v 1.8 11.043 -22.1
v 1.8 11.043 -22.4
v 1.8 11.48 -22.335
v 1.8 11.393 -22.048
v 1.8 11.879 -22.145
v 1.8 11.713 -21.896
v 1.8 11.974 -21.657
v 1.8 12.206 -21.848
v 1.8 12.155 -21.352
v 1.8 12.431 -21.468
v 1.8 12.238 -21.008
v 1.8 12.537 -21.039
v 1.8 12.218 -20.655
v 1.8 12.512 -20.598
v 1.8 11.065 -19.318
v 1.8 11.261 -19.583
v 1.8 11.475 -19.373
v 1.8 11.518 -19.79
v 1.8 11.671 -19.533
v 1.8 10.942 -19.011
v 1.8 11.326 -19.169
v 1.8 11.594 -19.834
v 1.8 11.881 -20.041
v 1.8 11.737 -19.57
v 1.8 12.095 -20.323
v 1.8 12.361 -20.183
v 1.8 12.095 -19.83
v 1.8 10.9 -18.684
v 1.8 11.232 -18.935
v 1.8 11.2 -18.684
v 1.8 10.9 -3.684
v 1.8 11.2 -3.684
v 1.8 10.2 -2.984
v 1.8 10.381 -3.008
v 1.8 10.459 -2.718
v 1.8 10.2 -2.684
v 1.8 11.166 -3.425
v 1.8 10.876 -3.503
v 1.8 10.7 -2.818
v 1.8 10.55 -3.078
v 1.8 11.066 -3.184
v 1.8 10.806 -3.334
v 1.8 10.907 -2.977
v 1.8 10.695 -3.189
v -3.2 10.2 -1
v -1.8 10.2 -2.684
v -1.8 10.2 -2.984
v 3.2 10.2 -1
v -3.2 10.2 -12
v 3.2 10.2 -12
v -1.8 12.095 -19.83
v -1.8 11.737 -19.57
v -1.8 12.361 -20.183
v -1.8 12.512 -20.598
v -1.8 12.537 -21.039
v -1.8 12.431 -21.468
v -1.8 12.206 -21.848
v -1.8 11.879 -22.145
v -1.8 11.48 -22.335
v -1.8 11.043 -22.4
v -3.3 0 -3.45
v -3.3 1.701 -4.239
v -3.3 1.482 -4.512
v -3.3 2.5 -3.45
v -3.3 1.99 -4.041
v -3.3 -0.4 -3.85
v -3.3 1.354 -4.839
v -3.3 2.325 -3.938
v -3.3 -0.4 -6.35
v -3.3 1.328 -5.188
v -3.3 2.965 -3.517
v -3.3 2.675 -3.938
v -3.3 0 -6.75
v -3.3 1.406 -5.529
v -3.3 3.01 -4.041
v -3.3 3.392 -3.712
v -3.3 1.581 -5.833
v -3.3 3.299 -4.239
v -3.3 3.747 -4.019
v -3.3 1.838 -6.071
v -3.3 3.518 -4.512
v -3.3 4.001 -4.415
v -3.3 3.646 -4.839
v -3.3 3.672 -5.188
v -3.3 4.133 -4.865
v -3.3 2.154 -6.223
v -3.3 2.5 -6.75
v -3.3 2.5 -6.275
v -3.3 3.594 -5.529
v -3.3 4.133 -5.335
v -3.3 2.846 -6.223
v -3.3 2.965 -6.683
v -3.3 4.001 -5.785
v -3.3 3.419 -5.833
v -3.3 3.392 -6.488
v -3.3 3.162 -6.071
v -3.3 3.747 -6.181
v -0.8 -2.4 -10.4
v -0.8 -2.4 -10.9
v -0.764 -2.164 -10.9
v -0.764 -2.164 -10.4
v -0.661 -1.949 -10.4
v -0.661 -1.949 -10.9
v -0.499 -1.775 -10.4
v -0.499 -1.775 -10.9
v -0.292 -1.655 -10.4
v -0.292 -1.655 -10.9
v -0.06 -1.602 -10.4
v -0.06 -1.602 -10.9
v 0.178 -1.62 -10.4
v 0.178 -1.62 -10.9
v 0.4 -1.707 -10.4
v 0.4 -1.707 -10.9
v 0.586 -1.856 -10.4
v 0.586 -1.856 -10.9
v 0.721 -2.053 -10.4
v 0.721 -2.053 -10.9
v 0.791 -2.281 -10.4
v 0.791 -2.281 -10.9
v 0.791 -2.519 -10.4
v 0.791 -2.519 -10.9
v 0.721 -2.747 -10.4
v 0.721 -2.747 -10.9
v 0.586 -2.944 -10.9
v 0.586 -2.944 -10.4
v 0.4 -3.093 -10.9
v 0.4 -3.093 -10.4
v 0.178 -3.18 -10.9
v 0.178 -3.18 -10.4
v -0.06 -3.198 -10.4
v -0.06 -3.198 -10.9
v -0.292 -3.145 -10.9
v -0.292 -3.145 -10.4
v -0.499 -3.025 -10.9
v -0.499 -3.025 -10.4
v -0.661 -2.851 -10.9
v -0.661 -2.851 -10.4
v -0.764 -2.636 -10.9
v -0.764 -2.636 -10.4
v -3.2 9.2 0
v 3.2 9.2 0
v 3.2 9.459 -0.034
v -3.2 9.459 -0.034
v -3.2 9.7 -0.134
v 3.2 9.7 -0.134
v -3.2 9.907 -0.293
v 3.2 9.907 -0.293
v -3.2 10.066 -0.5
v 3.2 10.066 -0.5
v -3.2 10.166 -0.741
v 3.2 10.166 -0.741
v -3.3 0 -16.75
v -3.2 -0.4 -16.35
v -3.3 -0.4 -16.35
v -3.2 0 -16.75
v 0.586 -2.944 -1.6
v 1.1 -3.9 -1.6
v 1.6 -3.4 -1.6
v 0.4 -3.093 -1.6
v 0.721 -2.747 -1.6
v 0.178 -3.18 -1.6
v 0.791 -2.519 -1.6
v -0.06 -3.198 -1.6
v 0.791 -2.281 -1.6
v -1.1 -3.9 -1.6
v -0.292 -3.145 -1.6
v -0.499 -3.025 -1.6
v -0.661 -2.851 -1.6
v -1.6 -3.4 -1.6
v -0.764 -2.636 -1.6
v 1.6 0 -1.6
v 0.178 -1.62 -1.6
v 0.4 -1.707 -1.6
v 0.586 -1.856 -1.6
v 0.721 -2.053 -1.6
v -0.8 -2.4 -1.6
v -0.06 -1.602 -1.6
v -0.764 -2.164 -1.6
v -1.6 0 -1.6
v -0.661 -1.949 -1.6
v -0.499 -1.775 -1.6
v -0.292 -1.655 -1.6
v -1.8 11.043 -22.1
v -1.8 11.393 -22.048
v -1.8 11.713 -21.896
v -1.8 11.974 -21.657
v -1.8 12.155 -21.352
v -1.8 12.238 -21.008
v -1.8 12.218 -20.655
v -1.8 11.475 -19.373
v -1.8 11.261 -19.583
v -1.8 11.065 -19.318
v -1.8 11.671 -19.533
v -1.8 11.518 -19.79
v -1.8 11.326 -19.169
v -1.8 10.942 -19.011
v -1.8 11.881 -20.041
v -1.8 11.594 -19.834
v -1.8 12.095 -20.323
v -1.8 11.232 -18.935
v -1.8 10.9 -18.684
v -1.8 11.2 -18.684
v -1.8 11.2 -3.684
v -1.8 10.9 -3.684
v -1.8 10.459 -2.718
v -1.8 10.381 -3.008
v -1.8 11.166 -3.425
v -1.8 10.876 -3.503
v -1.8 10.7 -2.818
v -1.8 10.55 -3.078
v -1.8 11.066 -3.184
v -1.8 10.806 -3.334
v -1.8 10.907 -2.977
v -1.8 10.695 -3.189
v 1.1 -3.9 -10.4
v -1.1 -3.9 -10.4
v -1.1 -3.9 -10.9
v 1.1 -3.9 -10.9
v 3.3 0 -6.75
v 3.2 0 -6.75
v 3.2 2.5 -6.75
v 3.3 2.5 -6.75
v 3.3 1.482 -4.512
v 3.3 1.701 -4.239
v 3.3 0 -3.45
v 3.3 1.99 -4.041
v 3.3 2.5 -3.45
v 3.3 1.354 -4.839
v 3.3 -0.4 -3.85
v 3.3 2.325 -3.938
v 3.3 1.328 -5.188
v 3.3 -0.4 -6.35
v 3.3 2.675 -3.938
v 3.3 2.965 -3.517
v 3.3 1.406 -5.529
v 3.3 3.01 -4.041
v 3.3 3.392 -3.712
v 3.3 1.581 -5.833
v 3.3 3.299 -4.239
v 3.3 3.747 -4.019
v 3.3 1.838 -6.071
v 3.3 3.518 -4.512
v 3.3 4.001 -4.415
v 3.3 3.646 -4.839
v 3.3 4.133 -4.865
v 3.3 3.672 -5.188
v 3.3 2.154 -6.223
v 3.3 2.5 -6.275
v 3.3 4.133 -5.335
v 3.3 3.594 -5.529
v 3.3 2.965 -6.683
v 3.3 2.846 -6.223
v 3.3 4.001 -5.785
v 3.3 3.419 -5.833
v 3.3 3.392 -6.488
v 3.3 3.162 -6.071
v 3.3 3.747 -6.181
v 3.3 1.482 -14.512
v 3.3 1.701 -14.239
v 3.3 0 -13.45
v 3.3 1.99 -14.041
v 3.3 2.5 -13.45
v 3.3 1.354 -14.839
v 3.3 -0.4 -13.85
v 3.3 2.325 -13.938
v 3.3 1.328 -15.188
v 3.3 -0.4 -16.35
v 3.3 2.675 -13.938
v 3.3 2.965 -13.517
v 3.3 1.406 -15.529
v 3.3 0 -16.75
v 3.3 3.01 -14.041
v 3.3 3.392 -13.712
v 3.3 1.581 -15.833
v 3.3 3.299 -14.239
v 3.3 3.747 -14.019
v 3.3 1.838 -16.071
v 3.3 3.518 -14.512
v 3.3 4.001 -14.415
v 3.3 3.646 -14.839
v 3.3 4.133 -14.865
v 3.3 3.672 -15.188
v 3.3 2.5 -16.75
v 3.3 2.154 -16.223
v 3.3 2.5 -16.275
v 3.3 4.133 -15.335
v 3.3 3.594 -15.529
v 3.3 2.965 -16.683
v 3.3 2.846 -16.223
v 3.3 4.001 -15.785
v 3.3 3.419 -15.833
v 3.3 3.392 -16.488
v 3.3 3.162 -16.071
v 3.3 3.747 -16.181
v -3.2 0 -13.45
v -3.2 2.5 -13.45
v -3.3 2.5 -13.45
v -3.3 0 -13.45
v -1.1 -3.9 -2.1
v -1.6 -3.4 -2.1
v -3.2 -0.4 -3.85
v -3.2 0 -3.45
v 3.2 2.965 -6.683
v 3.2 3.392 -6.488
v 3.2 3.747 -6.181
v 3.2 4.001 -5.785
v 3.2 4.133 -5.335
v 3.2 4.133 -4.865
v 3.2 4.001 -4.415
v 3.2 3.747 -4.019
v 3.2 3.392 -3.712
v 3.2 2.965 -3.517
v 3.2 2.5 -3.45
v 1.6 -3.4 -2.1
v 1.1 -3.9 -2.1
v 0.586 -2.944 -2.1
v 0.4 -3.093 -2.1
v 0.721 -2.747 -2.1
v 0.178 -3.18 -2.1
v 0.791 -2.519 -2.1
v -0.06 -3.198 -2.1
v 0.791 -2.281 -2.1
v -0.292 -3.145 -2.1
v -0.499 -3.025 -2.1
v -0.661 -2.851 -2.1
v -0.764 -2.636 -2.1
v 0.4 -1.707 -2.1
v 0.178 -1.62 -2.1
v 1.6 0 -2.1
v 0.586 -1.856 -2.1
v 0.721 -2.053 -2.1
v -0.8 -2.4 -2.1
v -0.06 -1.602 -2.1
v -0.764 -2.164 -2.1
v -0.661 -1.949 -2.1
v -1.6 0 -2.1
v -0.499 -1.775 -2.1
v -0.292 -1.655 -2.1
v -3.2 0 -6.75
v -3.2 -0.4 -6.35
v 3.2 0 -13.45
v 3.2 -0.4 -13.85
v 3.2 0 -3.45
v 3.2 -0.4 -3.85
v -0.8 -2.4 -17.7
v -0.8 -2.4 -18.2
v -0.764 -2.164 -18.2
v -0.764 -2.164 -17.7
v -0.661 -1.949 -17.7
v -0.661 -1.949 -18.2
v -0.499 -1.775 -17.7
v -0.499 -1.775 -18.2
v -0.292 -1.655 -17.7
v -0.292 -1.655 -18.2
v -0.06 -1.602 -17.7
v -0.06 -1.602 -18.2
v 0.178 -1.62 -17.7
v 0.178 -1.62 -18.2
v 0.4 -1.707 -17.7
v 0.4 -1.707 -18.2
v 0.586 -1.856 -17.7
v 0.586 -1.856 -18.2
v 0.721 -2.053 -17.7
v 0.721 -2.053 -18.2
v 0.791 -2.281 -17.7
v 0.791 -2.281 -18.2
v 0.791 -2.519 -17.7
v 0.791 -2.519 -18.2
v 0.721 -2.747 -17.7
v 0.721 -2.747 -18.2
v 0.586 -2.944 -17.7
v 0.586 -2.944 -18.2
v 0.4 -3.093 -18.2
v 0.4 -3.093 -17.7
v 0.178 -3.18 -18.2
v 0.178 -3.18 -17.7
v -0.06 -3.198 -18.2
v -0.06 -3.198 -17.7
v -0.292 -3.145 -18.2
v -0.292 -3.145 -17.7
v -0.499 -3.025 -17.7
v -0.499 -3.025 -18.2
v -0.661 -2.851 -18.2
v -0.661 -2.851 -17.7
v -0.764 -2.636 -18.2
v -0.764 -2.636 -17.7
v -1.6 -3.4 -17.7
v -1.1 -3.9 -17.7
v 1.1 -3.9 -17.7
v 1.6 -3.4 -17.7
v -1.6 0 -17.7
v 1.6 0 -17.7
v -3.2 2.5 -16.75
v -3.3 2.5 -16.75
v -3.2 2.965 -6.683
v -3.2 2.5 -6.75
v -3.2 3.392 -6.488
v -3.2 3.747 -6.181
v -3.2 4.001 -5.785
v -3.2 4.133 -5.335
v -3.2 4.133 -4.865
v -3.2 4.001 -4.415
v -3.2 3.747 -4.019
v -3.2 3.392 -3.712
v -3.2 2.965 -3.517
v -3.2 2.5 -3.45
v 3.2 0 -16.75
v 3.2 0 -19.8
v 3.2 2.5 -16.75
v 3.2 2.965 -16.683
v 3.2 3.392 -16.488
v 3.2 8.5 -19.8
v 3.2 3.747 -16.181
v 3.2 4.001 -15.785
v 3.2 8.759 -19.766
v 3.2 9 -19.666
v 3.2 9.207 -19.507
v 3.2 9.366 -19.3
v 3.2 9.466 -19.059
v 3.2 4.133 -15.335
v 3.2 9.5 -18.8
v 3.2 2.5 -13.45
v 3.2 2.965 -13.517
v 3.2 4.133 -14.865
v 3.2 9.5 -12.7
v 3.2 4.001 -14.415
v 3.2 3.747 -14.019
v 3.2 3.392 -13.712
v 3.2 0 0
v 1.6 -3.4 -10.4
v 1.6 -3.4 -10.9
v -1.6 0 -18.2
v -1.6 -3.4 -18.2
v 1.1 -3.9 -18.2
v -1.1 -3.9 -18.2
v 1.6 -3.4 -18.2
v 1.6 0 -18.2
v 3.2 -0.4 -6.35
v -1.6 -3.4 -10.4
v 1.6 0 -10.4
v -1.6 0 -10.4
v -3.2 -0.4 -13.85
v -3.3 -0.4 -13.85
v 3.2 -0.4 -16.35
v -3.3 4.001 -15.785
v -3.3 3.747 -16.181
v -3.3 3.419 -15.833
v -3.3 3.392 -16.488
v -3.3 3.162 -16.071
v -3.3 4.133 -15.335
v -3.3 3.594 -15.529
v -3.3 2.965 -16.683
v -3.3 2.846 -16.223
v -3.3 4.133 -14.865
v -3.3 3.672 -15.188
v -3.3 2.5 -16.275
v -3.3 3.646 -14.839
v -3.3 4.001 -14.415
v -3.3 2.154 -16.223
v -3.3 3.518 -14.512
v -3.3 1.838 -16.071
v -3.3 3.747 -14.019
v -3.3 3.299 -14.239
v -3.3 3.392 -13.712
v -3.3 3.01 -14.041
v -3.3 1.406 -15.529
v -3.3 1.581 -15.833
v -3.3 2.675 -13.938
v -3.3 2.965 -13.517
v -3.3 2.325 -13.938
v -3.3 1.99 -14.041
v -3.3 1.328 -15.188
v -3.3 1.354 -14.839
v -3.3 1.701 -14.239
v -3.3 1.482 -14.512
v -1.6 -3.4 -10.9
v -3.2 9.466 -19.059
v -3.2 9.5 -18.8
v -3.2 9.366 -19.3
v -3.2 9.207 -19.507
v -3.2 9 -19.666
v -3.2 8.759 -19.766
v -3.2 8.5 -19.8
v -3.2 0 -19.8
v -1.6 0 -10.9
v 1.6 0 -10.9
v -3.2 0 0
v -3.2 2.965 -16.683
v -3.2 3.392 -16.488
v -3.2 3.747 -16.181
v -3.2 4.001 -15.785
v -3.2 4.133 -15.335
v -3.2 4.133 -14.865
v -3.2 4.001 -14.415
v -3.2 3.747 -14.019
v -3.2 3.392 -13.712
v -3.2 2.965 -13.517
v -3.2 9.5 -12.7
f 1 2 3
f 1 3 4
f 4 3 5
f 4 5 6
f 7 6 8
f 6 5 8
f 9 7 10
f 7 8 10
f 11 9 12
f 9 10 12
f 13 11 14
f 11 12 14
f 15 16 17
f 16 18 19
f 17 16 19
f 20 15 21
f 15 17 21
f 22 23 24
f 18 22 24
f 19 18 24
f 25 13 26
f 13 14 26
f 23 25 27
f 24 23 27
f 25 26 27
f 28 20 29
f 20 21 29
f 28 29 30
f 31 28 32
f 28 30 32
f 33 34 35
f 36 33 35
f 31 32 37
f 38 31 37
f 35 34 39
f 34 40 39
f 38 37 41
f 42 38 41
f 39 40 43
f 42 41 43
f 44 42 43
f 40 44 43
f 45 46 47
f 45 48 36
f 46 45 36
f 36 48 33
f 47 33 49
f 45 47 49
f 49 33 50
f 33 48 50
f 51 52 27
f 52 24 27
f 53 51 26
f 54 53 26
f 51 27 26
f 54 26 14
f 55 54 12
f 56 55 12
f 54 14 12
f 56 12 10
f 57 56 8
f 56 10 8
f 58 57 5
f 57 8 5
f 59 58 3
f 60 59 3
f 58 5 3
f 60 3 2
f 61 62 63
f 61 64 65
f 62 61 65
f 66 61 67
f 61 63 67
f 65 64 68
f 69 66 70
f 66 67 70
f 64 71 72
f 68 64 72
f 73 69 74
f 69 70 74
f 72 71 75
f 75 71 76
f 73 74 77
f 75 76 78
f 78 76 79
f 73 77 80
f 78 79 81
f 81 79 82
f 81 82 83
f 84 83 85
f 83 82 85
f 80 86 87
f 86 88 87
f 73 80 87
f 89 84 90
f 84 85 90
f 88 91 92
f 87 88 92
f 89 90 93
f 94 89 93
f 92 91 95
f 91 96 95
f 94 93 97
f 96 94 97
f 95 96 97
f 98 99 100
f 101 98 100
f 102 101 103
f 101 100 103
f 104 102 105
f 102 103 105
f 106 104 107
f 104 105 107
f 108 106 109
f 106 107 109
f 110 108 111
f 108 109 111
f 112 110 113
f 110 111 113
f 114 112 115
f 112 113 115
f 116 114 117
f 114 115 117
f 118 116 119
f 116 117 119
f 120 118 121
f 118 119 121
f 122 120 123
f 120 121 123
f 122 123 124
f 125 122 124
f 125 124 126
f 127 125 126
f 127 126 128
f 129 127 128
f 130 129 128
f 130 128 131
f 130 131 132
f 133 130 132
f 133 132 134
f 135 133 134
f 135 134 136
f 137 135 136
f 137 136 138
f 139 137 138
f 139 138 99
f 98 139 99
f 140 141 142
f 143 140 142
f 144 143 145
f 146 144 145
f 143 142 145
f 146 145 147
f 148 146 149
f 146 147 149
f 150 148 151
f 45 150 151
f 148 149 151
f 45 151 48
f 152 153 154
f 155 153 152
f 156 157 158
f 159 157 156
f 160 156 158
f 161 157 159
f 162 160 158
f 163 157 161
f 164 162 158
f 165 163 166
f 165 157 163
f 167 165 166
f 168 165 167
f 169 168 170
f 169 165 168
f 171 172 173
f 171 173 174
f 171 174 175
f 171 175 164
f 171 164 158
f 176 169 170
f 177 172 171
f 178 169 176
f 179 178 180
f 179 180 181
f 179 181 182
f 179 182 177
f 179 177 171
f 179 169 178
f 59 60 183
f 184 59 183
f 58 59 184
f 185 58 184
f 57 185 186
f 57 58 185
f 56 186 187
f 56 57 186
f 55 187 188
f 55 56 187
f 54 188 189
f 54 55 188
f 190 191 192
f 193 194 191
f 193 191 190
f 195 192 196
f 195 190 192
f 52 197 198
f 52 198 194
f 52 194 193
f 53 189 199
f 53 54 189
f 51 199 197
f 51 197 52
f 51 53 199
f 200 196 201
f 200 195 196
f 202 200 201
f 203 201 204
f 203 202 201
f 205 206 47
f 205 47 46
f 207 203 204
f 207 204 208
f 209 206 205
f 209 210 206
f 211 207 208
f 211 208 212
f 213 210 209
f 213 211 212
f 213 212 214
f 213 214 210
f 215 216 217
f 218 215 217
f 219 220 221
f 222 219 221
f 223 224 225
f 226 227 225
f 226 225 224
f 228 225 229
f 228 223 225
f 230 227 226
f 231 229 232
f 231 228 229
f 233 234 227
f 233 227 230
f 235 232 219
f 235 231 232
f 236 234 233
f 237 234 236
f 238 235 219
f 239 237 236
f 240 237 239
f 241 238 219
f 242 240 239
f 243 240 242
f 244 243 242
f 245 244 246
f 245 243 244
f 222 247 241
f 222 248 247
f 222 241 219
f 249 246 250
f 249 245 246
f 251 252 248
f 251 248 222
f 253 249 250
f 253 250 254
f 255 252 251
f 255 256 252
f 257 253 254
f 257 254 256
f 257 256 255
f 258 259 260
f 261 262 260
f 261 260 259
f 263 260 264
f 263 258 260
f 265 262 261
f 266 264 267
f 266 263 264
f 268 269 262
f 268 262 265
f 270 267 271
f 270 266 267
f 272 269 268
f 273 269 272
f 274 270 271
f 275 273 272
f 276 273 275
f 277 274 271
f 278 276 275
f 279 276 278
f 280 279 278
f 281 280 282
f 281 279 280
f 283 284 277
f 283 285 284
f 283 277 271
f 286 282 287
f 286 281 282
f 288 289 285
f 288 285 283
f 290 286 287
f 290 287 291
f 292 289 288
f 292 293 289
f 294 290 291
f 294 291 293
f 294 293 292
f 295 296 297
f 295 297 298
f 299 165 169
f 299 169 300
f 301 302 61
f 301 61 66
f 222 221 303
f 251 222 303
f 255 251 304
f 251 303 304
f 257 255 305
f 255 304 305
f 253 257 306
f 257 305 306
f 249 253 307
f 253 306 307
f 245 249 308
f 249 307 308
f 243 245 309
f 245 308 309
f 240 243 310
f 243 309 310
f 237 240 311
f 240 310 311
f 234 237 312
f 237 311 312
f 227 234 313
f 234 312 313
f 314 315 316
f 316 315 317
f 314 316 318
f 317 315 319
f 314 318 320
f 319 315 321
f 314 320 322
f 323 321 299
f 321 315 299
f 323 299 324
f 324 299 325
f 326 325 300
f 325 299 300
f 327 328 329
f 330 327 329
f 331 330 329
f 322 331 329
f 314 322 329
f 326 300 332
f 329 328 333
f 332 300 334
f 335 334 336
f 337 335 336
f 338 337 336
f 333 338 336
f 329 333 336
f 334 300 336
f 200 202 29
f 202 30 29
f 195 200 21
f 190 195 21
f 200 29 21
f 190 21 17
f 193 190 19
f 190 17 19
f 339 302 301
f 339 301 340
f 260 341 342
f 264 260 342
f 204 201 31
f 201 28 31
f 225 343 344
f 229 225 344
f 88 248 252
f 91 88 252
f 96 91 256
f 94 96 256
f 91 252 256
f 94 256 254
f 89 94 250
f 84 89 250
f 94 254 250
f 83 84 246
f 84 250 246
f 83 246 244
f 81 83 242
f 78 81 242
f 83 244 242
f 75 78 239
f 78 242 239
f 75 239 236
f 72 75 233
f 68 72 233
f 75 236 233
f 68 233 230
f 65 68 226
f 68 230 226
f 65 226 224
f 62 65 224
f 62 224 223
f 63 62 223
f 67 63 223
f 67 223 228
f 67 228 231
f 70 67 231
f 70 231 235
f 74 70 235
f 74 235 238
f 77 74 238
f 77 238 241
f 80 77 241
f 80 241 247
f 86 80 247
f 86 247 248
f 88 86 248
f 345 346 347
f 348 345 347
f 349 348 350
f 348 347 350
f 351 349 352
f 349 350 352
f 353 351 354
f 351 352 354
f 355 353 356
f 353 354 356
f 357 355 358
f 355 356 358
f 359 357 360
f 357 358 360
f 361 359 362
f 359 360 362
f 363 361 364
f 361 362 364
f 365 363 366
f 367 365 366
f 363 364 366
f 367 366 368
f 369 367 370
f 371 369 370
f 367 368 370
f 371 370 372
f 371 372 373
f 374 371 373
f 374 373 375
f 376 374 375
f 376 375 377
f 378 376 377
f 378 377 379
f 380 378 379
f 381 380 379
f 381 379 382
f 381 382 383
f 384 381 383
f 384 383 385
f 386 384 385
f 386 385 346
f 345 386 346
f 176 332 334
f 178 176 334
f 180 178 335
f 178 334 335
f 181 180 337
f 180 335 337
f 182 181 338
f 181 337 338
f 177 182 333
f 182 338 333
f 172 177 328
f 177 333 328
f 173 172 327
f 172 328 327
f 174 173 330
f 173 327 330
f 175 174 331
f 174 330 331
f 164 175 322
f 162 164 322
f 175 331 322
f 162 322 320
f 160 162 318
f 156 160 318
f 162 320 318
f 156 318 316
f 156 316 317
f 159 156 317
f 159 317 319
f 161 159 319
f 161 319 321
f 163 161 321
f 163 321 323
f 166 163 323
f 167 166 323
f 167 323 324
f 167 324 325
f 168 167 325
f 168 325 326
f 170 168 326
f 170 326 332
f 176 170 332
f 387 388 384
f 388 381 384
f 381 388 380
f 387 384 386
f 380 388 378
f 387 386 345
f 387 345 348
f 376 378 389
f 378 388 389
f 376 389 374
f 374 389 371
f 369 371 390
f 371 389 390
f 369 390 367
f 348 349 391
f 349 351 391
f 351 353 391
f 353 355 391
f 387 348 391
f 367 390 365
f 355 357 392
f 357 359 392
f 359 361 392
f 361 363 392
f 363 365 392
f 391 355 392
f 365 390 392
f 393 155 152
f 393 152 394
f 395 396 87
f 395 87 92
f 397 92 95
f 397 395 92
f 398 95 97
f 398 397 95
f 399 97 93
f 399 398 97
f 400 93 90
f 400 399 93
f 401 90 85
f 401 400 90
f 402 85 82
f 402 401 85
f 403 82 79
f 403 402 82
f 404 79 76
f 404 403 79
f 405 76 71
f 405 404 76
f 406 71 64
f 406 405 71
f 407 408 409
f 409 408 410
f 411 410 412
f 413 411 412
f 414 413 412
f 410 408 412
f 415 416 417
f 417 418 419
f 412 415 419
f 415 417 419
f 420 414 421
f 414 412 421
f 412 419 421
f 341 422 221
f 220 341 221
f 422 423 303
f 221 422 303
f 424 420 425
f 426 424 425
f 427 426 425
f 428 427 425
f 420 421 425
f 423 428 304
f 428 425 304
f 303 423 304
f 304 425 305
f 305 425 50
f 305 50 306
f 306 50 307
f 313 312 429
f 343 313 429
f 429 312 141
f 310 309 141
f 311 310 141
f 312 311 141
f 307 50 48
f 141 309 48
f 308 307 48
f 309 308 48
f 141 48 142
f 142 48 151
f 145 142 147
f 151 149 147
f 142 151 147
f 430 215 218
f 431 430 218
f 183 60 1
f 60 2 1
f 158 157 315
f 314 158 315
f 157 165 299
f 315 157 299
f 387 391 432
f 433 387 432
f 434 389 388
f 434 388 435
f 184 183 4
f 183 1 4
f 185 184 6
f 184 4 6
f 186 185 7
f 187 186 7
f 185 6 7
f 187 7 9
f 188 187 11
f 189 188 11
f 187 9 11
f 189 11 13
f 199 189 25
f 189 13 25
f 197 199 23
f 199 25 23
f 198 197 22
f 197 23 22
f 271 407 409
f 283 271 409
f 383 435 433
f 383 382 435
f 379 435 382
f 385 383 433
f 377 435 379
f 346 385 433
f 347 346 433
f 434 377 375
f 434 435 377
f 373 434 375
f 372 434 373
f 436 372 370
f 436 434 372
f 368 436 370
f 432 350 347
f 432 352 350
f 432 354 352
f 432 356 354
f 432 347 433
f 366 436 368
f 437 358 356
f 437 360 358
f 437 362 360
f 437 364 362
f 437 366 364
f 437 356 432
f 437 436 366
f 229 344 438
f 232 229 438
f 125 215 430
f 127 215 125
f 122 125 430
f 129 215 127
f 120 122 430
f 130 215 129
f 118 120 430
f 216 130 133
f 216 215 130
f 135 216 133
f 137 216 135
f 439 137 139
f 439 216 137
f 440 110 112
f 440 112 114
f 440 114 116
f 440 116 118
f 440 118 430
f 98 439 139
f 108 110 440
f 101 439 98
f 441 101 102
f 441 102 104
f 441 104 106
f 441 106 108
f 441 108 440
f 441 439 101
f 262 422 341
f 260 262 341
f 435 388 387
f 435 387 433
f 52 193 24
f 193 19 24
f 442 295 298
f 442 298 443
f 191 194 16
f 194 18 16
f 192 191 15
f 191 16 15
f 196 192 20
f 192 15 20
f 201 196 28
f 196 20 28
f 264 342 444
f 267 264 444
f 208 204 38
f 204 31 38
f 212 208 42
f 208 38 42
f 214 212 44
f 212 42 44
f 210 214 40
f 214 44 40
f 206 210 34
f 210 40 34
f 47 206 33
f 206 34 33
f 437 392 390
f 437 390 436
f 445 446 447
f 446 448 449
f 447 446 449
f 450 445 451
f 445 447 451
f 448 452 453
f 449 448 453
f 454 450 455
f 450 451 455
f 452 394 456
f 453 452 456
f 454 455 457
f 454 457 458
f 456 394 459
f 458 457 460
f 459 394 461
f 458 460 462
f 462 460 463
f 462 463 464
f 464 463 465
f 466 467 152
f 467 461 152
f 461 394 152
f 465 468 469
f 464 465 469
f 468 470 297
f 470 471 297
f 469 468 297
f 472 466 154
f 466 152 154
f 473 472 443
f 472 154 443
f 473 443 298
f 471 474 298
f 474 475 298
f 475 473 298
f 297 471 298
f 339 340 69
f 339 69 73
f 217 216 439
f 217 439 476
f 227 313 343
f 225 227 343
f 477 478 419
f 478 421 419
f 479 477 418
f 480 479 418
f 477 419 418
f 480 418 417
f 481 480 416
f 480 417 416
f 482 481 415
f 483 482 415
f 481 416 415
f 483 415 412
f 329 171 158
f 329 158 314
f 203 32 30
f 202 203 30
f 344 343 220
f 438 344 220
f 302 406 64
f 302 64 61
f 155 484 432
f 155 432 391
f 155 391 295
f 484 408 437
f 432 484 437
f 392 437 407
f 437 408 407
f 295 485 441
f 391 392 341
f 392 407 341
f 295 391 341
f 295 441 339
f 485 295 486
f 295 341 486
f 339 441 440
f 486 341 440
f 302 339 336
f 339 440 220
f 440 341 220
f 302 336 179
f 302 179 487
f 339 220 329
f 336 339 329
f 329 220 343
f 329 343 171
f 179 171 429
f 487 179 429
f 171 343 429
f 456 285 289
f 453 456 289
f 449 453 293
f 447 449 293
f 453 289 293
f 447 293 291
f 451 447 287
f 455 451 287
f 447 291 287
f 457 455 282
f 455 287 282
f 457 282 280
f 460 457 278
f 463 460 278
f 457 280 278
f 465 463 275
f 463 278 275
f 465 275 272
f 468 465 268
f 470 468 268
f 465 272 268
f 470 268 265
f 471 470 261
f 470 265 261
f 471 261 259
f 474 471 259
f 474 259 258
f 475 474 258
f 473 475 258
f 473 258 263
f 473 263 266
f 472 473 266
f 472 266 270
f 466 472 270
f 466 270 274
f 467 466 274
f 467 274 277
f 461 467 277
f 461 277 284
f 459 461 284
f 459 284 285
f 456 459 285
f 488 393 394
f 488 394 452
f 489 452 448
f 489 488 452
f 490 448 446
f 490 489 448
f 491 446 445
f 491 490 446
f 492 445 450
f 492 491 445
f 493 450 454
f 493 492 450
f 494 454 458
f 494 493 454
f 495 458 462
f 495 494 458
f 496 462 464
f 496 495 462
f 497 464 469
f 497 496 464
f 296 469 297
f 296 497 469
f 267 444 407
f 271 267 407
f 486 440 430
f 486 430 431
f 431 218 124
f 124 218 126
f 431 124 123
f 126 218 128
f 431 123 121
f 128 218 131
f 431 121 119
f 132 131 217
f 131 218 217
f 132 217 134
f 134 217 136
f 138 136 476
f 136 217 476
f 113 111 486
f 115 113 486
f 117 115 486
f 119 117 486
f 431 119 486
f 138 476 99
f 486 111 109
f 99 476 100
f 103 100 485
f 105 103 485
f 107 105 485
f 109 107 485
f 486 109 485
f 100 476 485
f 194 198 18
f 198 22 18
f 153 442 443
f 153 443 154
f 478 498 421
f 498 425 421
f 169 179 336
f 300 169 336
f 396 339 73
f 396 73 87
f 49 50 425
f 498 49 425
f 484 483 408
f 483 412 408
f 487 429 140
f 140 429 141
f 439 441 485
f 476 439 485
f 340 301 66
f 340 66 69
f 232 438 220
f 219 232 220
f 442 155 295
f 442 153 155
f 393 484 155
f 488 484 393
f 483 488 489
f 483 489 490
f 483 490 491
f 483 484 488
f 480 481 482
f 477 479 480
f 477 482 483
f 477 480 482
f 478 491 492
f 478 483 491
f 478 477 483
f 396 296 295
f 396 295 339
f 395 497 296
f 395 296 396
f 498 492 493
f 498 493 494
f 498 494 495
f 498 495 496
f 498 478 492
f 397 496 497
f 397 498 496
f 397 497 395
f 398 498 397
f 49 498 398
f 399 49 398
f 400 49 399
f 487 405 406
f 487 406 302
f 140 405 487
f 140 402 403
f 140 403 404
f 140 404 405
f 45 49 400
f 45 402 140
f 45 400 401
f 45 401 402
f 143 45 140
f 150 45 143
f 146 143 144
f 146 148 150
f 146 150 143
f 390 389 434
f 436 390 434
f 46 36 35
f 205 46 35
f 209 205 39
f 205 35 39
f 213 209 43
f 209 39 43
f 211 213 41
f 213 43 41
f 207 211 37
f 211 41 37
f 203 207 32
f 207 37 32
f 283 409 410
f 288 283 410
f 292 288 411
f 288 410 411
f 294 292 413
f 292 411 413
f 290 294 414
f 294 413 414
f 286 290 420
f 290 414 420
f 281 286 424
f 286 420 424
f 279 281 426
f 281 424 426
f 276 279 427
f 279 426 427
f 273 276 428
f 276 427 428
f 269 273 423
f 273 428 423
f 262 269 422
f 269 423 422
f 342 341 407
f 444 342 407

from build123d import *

# Parameters (mm, degrees)
EXTRUDE_1_DEPTH        = 3.2
SKETCH_3_W             = 0.5
SKETCH_3_H             = 3.9
EXTRUDE_3_DEPTH        = 1.6
CHAMFER_1_SIZE         = 0.5
SKETCH_4_R             = 0.8
CUT_EXTRUDE_1_DEPTH    = 22.107344693
EXTRUDE_4_DEPTH        = 0.1
PATTERN_LINEAR_1_COUNT = 2
PATTERN_LINEAR_1_PITCH = 10
MIRROR_1_COPY_1_DEPTH  = 0.1
SKETCH_6_R             = 1.175
CUT_EXTRUDE_2_DEPTH    = 24.230152819
EXTRUDE_2_DEPTH        = 1.8


with BuildPart() as part:
    # ｽｹｯﾁ1 → ﾎﾞｽ - 押し出し1 (new, symmetric)
    with BuildSketch(Plane(origin=(0, 0, 0), x_dir=(0, 0, -1), z_dir=(1, 0, 0))):
        with BuildLine():
            Line((12, 10.2), (12.7, 9.5))
            Line((12.7, 9.5), (18.8, 9.5))
            ThreePointArc((18.8, 9.5), (19.507106781, 9.207106781), (19.8, 8.5))
            Line((19.8, 8.5), (19.8, 0))
            Line((19.8, 0), (0, 0))
            Line((0, 0), (0, 9.2))
            ThreePointArc((0, 9.2), (0.292893219, 9.907106781), (1, 10.2))
            Line((1, 10.2), (12, 10.2))
        make_face()
    extrude(amount=EXTRUDE_1_DEPTH, both=True)

    # ｽｹｯﾁ3 → ﾎﾞｽ - 押し出し3 (add, symmetric)
    with BuildSketch(Plane(origin=(0, 0, 0), x_dir=(0, 0, -1), z_dir=(1, 0, 0))):
        with Locations((1.85, -1.95)):
            Rectangle(SKETCH_3_W, SKETCH_3_H)
        with Locations((10.65, -1.95)):
            Rectangle(SKETCH_3_W, SKETCH_3_H)
        with Locations((17.95, -1.95)):
            Rectangle(SKETCH_3_W, SKETCH_3_H)
    extrude(amount=EXTRUDE_3_DEPTH, both=True)

    # 面取り1
    chamfer_1_edges = [part.edges().sort_by_distance(p)[0] for p in [
        (-1.6, -3.9, -1.85),
        (1.6, -3.9, -1.85),
        (-1.6, -3.9, -10.65),
        (1.6, -3.9, -10.65),
        (-1.6, -3.9, -17.95),
        (1.6, -3.9, -17.95),
    ]]
    chamfer(chamfer_1_edges, length=CHAMFER_1_SIZE)

    # ｽｹｯﾁ4 → ｶｯﾄ - 押し出し1 (cut, through all)
    with BuildSketch(Plane(origin=(0, 0, -18.2), x_dir=(-1, 0, 0), z_dir=(0, 0, -1))):
        with Locations((0, -2.4)):
            Circle(SKETCH_4_R)
    extrude(amount=-CUT_EXTRUDE_1_DEPTH, mode=Mode.SUBTRACT)

    # ｽｹｯﾁ5 → ﾎﾞｽ - 押し出し4 (add)
    with BuildSketch(Plane(origin=(3.2, 0, 0), x_dir=(0, 0, -1), z_dir=(1, 0, 0))):
        with BuildLine():
            Line((3.45, 2.5), (3.45, 0))
            Line((3.45, 0), (3.85, -0.4))
            Line((3.85, -0.4), (6.35, -0.4))
            Line((6.35, -0.4), (6.75, 0))
            Line((6.75, 0), (6.75, 2.5))
            ThreePointArc((6.75, 2.5), (5.1, 4.15), (3.45, 2.5))
        make_face()
    extrude_4 = extrude(amount=EXTRUDE_4_DEPTH)

    # 直線ﾊﾟﾀｰﾝ1: ﾎﾞｽ - 押し出し4 ×2
    with Locations(*[(0, 0, -i * PATTERN_LINEAR_1_PITCH) for i in range(1, PATTERN_LINEAR_1_COUNT)]):
        add(extrude_4)

    # ﾐﾗｰ1: ﾎﾞｽ - 押し出し4 across plane
    add(extrude_4.mirror(Plane(origin=(0, 0, 0), x_dir=(0, 0, 1), z_dir=(1, 0, 0))))

    # ﾐﾗｰ1 copy 1 sketch → ﾐﾗｰ1 copy 1 (add)
    with BuildSketch(Plane(origin=(-3.2, 0, -10), x_dir=(0, 0, -1), z_dir=(-1, 0, 0))):
        with BuildLine():
            Line((3.45, -2.5), (3.45, 0))
            Line((3.45, 0), (3.85, 0.4))
            Line((3.85, 0.4), (6.35, 0.4))
            Line((6.35, 0.4), (6.75, 0))
            Line((6.75, 0), (6.75, -2.5))
            ThreePointArc((6.75, -2.5), (5.1, -4.15), (3.45, -2.5))
        make_face()
    extrude(amount=MIRROR_1_COPY_1_DEPTH)

    # ｽｹｯﾁ6 → ｶｯﾄ - 押し出し2 (cut, through all)
    with BuildSketch(Plane(origin=(3.3, 0, 0), x_dir=(0, 0, -1), z_dir=(1, 0, 0))):
        with Locations((5.1, 2.5)):
            Circle(SKETCH_6_R)
        with Locations((15.1, 2.5)):
            Circle(SKETCH_6_R)
    extrude(amount=-CUT_EXTRUDE_2_DEPTH, mode=Mode.SUBTRACT)

    # ｽｹｯﾁ2 → ﾎﾞｽ - 押し出し2 (add, symmetric)
    with BuildSketch(Plane(origin=(0, 0, 0), x_dir=(0, 0, -1), z_dir=(1, 0, 0))):
        with BuildLine():
            Line((3.683747293, 11.2), (18.683747293, 11.2))
            ThreePointArc((18.683747293, 11.2), (19.1692369, 11.325757561), (19.532618528, 11.671400315))
            Line((19.532618528, 11.671400315), (19.570248376, 11.737273482))
            ThreePointArc((19.570248376, 11.737273482), (21.257332173, 12.5), (22.4, 11.043183705))
            Line((22.4, 11.043183705), (22.1, 11.043183705))
            ThreePointArc((22.1, 11.043183705), (21.183255021, 12.209274007), (19.833722345, 11.59368526))
            Line((19.833722345, 11.59368526), (19.790473564, 11.517975834))
            ThreePointArc((19.790473564, 11.517975834), (19.317532977, 11.064960041), (18.683747293, 10.9))
            Line((18.683747293, 10.9), (3.683747293, 10.9))
            ThreePointArc((3.683747293, 10.9), (3.188772547, 10.694974747), (2.983747293, 10.2))
            Line((2.983747293, 10.2), (2.683747293, 10.2))
            ThreePointArc((2.683747293, 10.2), (2.976640512, 10.907106781), (3.683747293, 11.2))
        make_face()
    extrude(amount=EXTRUDE_2_DEPTH, both=True)


solid = part.part
